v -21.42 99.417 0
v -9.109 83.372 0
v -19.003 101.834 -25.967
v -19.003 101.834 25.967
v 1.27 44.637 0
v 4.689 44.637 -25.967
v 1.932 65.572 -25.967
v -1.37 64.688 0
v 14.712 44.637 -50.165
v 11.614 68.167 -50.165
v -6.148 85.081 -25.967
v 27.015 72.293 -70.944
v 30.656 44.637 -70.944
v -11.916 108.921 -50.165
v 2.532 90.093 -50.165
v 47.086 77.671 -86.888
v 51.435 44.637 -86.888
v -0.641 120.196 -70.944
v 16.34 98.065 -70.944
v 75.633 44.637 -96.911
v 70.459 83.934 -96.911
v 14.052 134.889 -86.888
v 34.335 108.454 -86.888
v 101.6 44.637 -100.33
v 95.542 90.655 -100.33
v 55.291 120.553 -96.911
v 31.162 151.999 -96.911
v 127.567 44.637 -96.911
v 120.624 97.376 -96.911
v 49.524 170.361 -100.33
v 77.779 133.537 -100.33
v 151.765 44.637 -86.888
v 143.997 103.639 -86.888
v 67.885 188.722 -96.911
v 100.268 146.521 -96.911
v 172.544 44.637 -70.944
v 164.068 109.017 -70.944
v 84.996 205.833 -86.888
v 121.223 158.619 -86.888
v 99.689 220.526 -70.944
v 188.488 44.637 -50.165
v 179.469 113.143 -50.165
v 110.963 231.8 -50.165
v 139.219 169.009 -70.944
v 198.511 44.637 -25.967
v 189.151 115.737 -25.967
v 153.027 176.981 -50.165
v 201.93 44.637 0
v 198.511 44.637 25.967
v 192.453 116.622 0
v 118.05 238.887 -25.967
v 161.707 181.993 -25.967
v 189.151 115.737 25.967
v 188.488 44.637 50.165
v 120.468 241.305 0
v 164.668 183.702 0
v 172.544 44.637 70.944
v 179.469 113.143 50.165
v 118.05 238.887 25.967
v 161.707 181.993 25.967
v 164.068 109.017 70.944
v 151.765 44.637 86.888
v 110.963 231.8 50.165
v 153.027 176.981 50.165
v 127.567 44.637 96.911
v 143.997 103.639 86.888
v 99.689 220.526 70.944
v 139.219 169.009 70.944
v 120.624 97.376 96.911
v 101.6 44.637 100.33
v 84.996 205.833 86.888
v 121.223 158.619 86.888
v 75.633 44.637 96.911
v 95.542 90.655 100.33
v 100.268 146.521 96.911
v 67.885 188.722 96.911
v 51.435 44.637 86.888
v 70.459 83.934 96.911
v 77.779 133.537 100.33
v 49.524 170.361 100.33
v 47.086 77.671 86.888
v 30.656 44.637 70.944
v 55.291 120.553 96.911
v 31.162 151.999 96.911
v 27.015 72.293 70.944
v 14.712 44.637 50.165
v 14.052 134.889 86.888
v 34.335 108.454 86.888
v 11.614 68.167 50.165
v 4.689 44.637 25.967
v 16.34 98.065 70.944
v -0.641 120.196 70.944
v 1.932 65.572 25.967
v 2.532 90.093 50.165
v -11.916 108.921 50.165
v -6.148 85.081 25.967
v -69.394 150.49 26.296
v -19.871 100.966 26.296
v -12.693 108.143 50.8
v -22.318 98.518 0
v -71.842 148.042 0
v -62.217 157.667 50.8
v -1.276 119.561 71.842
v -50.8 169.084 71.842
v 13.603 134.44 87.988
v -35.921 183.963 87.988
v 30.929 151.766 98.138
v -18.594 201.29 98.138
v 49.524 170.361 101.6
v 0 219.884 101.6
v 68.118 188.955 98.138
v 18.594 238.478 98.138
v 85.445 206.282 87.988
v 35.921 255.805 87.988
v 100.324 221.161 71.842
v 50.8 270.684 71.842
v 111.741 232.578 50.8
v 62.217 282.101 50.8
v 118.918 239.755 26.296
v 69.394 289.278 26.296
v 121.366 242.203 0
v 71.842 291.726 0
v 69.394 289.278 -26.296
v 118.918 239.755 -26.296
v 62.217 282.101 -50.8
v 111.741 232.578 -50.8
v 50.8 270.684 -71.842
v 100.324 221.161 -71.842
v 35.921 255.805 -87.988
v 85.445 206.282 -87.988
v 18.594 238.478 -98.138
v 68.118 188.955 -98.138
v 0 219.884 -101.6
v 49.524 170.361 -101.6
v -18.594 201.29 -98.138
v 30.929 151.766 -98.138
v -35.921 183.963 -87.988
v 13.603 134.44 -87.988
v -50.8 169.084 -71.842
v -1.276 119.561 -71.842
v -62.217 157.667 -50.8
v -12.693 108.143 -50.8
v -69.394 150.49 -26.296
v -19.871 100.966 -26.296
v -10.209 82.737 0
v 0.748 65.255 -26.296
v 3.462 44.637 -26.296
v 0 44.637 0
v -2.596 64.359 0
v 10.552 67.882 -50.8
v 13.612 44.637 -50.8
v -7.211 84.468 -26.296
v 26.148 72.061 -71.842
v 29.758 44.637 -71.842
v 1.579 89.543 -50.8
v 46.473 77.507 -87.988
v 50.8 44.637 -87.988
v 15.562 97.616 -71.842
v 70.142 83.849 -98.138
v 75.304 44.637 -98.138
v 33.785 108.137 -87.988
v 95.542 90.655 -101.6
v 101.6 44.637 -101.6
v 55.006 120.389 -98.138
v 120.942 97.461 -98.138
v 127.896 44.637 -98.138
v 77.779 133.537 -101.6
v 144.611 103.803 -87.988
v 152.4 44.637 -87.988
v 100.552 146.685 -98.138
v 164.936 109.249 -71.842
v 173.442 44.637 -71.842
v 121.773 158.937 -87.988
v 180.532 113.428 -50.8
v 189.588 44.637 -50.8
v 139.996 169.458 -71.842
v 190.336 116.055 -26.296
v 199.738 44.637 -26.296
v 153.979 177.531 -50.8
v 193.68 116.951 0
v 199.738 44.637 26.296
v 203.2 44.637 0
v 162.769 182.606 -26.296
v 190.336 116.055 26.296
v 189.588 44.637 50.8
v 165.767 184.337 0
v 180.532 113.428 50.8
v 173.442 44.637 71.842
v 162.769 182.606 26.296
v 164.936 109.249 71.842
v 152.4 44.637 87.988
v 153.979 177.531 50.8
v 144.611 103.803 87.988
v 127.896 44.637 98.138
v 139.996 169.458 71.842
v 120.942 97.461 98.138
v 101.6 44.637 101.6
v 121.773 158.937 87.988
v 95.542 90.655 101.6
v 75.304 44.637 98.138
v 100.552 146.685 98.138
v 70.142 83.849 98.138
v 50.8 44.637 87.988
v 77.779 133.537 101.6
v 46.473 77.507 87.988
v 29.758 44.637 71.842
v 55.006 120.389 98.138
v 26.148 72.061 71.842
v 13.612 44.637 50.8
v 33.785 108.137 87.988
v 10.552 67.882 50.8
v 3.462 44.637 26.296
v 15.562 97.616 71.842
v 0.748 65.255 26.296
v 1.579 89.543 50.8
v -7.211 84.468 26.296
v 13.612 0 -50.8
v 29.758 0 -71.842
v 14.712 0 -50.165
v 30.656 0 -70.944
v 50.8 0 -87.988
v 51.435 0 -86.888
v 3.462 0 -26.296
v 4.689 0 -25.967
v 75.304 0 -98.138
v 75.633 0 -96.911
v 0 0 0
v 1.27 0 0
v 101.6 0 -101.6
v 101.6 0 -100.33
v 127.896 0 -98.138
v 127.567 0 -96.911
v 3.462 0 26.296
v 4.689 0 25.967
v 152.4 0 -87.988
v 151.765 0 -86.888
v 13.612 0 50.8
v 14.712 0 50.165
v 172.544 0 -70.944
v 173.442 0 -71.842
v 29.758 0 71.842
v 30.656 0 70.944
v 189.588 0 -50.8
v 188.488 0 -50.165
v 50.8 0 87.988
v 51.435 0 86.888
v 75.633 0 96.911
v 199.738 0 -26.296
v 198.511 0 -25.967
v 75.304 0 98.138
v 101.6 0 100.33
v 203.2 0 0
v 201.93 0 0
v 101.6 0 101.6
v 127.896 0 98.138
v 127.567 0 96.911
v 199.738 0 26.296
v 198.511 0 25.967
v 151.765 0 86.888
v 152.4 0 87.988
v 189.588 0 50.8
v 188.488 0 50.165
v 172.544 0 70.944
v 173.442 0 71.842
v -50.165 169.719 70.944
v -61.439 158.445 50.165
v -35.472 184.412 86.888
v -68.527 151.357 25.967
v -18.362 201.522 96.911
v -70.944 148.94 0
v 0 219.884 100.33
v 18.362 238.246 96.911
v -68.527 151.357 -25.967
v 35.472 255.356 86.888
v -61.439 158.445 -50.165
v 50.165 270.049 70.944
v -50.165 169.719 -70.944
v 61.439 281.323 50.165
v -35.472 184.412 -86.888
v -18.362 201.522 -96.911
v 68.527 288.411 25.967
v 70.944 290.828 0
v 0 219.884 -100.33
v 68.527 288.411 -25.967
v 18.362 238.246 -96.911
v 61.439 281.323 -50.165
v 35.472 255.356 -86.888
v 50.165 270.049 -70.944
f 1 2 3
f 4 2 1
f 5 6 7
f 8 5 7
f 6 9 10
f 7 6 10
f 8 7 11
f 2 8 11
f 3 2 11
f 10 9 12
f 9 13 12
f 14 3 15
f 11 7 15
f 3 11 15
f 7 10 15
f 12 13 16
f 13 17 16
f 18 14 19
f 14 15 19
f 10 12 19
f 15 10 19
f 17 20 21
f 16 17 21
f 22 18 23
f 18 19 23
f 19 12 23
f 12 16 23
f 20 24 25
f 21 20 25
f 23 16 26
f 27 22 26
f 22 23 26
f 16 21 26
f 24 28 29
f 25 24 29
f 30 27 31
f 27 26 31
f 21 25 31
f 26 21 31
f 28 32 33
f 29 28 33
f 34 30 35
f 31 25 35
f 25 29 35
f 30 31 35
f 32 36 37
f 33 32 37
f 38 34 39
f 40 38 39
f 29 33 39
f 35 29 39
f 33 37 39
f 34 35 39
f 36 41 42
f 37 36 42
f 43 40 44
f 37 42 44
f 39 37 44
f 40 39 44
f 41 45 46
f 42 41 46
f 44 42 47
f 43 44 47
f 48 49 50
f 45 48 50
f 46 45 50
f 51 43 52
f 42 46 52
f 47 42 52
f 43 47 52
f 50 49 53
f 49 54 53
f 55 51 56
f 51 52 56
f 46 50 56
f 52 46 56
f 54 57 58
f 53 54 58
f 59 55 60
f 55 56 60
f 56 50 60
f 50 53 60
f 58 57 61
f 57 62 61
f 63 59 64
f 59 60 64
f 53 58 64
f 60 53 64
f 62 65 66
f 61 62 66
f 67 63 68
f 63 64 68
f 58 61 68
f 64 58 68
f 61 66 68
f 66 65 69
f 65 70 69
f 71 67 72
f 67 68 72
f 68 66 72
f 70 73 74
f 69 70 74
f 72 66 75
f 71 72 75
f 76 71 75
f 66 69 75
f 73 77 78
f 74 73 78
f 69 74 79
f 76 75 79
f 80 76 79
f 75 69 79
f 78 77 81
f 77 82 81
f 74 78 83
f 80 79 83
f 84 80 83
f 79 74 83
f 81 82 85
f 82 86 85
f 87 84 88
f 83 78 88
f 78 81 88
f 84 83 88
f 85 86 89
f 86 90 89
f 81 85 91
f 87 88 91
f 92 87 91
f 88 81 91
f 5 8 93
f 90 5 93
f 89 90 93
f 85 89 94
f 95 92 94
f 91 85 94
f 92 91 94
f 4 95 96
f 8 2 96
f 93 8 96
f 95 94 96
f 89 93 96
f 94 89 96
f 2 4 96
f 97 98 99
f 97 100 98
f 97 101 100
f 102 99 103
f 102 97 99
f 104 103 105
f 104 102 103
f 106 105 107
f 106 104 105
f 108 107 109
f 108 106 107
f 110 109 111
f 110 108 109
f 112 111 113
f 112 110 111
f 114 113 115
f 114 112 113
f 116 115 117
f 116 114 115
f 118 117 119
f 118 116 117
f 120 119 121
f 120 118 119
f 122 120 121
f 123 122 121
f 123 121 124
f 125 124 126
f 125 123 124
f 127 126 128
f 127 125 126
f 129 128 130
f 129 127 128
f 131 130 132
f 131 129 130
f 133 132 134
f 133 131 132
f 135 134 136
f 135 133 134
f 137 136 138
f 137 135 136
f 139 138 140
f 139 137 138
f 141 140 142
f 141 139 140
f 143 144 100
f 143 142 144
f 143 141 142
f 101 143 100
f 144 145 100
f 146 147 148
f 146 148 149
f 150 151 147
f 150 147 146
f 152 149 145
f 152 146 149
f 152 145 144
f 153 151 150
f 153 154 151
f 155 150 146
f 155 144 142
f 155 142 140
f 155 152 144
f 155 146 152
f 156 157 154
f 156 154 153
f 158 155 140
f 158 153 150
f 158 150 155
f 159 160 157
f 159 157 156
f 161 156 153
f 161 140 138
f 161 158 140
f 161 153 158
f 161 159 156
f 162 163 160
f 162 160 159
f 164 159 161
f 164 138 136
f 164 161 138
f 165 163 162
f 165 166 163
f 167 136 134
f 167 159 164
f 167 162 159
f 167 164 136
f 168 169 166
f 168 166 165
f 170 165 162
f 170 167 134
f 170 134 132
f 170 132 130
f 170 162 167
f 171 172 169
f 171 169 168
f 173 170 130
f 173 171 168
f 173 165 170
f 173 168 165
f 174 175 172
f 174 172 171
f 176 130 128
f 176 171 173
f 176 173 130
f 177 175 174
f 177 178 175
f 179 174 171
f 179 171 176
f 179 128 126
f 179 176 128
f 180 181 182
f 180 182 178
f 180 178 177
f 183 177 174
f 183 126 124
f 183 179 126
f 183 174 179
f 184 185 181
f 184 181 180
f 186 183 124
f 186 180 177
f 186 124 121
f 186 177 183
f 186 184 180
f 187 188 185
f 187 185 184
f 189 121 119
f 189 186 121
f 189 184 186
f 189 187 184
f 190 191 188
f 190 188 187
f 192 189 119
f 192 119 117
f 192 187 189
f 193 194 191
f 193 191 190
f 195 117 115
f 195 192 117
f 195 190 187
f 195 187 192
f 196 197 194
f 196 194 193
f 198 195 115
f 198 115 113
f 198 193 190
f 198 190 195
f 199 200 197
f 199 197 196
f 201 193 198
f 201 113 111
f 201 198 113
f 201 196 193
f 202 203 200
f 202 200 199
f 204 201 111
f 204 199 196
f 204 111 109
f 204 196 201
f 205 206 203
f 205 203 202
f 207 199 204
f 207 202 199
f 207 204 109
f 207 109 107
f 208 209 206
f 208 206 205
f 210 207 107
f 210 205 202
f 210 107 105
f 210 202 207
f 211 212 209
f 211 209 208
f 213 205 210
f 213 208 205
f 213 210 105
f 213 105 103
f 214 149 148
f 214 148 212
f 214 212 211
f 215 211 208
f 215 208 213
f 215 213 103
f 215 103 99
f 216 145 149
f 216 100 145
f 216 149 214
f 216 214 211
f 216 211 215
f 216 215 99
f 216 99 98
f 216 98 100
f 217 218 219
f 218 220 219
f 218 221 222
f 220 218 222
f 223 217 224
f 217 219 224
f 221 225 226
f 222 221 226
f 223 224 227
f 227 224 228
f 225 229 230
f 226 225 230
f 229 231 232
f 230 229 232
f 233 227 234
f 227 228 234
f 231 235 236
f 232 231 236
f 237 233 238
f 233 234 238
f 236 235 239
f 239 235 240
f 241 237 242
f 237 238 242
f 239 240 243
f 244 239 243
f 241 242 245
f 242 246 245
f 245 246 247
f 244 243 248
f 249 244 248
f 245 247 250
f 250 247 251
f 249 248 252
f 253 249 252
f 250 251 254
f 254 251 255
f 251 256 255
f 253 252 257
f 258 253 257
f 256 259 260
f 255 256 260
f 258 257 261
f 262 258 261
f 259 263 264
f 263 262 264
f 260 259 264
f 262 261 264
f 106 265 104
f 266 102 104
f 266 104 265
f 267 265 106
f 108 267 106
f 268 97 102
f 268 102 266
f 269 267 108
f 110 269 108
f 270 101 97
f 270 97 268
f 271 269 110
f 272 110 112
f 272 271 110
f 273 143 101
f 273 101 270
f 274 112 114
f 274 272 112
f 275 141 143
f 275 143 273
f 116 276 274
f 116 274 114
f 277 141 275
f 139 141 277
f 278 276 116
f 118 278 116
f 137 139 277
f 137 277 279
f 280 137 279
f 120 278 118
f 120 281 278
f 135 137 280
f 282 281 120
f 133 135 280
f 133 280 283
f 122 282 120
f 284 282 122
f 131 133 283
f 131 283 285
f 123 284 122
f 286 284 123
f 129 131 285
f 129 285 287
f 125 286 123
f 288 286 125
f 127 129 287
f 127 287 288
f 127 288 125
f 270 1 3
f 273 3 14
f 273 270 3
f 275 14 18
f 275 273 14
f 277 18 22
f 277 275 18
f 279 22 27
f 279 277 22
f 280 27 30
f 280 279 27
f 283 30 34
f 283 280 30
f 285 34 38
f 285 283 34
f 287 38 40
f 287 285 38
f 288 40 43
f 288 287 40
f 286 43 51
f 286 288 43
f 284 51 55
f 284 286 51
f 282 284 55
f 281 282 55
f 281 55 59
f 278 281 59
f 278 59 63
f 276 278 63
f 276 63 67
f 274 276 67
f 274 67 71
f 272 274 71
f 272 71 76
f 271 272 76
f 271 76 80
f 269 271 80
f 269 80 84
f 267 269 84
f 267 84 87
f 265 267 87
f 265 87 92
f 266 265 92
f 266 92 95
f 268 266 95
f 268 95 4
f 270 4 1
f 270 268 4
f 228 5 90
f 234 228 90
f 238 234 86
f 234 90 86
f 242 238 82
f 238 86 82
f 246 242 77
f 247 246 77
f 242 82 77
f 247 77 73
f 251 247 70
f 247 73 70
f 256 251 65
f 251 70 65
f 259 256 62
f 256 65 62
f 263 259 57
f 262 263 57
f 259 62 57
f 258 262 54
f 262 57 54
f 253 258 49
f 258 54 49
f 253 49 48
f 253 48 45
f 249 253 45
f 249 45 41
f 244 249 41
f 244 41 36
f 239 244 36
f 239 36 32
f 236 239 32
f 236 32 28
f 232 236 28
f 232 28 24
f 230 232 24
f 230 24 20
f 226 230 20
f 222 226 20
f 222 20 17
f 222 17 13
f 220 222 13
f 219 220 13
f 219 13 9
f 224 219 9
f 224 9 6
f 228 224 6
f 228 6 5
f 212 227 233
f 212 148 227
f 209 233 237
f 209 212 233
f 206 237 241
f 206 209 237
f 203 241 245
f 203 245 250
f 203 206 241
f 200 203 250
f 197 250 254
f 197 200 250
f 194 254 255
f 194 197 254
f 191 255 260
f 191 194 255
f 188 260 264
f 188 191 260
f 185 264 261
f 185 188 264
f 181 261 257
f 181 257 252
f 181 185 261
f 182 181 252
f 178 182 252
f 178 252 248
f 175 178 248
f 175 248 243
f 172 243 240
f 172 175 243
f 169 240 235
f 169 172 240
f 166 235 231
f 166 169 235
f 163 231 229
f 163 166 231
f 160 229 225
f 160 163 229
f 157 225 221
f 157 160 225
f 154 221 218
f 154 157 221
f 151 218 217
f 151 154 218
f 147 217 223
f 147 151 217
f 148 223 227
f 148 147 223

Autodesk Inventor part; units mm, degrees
ref_plane "XZ Plane" through (0, 0, 0) normal (0, 1, 0) x (-1, 0, 0)
sketch "Sketch1" plane through (0, 0, 0) normal (0, 0, 1) x (1, 0, 0)
  line L0 (0, 0) -> (0, 44.6369)
  line L1 (-22.3185, 98.5185) -> (-71.842, 148.042)
  arc A0 (0, 44.6369) -> (-22.3185, 98.5185) centre (-76.2, 44.6369) ccw
  point P0 (0, 76.2)
  dimension "d0" = 135
  dimension "d1" = 76.2
  dimension "d2" = 101.6
  dimension "d3" = 76.2
sketch "Sketch2" plane through (0, 0, 0) normal (0, 1, 0) x (-1, 0, 0)
  circle A0 centre (-101.6, 0) radius 101.6
  line L0 (0, 0) -> (-124.0253, 0) construction
  circle A1 centre (-101.6, 0) radius 100.33
  dimension "d4" = 203.2
  dimension "d6" = 1.27
sweep "Sweep1" add profiles "Sketch2" path "Sketch1"
ref_plane "Work Plane1" through (101.6, 0, 0) normal (1, 0, 0) x (0, 1, 0)
ref_plane "Work Plane4" through (101.6, 0, 0) normal (0, -1, 0) x (1, 0, 0)
ref_plane "Work Plane6" through (-71.842, 148.042, 0) normal (-0.7071, 0.7071, 0) x (-0.7071, -0.7071, 0)
ref_plane "Work Plane7" through (0, 0, 58.42) normal (0, 0, 1) x (1, 0, 0)
ref_plane "Work Plane8" through (0, 0, -58.42) normal (0, 0, 1) x (1, 0, 0)
sketch "Sketch4" plane through (0, 0, 58.42) normal (0, 0, 1) x (1, 0, 0)
  line L0 (58.7778, 278.6619) -> (108.3014, 229.1383) projected
  arc A0 (184.7244, 44.6369) -> (108.3014, 229.1383) centre (-76.2, 44.6369) ccw projected
  line L1 (184.7244, 44.6369) -> (184.7244, 0) projected
  line L2 (184.7244, 0) -> (183.1672, 0) projected
  line L3 (183.1672, 0) -> (183.1672, 44.6369) projected
  arc A1 (183.1672, 44.6369) -> (107.2003, 228.0373) centre (-76.2, 44.6369) ccw projected
  line L4 (107.2003, 228.0373) -> (57.6767, 277.5608) projected
  line L5 (57.6767, 277.5608) -> (58.7778, 278.6619) projected
  line L6 (-9.2542, 111.5827) -> (-58.7778, 161.1063) projected
  line L7 (-58.7778, 161.1063) -> (-57.6767, 162.2074) projected
  line L8 (-57.6767, 162.2074) -> (-8.1532, 112.6838) projected
  arc A2 (20.0328, 44.6369) -> (-8.1532, 112.6838) centre (-76.2, 44.6369) ccw projected
  line L9 (20.0328, 44.6369) -> (20.0328, 0) projected
  line L10 (20.0328, 0) -> (18.4756, 0) projected
  line L11 (18.4756, 0) -> (18.4756, 44.6369) projected
  arc A3 (18.4756, 44.6369) -> (-9.2542, 111.5827) centre (-76.2, 44.6369) ccw projected
  line L12 (-22.3185, 98.5185) -> (-71.842, 148.042) projected
  arc A4 (0, 44.6369) -> (-22.3185, 98.5185) centre (-76.2, 44.6369) ccw projected
  line L13 (0, 0) -> (0, 44.6369) projected
  line L14 (203.2, 0) -> (203.2, 44.6369) projected
  arc A5 (203.2, 44.6369) -> (121.3656, 242.2026) centre (-76.2, 44.6369) ccw projected
  line L15 (121.3656, 242.2026) -> (71.842, 291.7261) projected
  dimension "d14" = 18.4756
  dimension "d15" = 18.4756
  dimension "d16" = 18.4756
  dimension "d17" = 76.2
  dimension "d18" = 94.6756
  dimension "d19" = 70.0369
  dimension "d20" = 44.6369
  dimension "d21" = 135
equation "\"angle\" = 45deg"
equation "\"d8\" = -d7"
equation "\"d7\" = 58.42"
properties part number "Ball Path"
